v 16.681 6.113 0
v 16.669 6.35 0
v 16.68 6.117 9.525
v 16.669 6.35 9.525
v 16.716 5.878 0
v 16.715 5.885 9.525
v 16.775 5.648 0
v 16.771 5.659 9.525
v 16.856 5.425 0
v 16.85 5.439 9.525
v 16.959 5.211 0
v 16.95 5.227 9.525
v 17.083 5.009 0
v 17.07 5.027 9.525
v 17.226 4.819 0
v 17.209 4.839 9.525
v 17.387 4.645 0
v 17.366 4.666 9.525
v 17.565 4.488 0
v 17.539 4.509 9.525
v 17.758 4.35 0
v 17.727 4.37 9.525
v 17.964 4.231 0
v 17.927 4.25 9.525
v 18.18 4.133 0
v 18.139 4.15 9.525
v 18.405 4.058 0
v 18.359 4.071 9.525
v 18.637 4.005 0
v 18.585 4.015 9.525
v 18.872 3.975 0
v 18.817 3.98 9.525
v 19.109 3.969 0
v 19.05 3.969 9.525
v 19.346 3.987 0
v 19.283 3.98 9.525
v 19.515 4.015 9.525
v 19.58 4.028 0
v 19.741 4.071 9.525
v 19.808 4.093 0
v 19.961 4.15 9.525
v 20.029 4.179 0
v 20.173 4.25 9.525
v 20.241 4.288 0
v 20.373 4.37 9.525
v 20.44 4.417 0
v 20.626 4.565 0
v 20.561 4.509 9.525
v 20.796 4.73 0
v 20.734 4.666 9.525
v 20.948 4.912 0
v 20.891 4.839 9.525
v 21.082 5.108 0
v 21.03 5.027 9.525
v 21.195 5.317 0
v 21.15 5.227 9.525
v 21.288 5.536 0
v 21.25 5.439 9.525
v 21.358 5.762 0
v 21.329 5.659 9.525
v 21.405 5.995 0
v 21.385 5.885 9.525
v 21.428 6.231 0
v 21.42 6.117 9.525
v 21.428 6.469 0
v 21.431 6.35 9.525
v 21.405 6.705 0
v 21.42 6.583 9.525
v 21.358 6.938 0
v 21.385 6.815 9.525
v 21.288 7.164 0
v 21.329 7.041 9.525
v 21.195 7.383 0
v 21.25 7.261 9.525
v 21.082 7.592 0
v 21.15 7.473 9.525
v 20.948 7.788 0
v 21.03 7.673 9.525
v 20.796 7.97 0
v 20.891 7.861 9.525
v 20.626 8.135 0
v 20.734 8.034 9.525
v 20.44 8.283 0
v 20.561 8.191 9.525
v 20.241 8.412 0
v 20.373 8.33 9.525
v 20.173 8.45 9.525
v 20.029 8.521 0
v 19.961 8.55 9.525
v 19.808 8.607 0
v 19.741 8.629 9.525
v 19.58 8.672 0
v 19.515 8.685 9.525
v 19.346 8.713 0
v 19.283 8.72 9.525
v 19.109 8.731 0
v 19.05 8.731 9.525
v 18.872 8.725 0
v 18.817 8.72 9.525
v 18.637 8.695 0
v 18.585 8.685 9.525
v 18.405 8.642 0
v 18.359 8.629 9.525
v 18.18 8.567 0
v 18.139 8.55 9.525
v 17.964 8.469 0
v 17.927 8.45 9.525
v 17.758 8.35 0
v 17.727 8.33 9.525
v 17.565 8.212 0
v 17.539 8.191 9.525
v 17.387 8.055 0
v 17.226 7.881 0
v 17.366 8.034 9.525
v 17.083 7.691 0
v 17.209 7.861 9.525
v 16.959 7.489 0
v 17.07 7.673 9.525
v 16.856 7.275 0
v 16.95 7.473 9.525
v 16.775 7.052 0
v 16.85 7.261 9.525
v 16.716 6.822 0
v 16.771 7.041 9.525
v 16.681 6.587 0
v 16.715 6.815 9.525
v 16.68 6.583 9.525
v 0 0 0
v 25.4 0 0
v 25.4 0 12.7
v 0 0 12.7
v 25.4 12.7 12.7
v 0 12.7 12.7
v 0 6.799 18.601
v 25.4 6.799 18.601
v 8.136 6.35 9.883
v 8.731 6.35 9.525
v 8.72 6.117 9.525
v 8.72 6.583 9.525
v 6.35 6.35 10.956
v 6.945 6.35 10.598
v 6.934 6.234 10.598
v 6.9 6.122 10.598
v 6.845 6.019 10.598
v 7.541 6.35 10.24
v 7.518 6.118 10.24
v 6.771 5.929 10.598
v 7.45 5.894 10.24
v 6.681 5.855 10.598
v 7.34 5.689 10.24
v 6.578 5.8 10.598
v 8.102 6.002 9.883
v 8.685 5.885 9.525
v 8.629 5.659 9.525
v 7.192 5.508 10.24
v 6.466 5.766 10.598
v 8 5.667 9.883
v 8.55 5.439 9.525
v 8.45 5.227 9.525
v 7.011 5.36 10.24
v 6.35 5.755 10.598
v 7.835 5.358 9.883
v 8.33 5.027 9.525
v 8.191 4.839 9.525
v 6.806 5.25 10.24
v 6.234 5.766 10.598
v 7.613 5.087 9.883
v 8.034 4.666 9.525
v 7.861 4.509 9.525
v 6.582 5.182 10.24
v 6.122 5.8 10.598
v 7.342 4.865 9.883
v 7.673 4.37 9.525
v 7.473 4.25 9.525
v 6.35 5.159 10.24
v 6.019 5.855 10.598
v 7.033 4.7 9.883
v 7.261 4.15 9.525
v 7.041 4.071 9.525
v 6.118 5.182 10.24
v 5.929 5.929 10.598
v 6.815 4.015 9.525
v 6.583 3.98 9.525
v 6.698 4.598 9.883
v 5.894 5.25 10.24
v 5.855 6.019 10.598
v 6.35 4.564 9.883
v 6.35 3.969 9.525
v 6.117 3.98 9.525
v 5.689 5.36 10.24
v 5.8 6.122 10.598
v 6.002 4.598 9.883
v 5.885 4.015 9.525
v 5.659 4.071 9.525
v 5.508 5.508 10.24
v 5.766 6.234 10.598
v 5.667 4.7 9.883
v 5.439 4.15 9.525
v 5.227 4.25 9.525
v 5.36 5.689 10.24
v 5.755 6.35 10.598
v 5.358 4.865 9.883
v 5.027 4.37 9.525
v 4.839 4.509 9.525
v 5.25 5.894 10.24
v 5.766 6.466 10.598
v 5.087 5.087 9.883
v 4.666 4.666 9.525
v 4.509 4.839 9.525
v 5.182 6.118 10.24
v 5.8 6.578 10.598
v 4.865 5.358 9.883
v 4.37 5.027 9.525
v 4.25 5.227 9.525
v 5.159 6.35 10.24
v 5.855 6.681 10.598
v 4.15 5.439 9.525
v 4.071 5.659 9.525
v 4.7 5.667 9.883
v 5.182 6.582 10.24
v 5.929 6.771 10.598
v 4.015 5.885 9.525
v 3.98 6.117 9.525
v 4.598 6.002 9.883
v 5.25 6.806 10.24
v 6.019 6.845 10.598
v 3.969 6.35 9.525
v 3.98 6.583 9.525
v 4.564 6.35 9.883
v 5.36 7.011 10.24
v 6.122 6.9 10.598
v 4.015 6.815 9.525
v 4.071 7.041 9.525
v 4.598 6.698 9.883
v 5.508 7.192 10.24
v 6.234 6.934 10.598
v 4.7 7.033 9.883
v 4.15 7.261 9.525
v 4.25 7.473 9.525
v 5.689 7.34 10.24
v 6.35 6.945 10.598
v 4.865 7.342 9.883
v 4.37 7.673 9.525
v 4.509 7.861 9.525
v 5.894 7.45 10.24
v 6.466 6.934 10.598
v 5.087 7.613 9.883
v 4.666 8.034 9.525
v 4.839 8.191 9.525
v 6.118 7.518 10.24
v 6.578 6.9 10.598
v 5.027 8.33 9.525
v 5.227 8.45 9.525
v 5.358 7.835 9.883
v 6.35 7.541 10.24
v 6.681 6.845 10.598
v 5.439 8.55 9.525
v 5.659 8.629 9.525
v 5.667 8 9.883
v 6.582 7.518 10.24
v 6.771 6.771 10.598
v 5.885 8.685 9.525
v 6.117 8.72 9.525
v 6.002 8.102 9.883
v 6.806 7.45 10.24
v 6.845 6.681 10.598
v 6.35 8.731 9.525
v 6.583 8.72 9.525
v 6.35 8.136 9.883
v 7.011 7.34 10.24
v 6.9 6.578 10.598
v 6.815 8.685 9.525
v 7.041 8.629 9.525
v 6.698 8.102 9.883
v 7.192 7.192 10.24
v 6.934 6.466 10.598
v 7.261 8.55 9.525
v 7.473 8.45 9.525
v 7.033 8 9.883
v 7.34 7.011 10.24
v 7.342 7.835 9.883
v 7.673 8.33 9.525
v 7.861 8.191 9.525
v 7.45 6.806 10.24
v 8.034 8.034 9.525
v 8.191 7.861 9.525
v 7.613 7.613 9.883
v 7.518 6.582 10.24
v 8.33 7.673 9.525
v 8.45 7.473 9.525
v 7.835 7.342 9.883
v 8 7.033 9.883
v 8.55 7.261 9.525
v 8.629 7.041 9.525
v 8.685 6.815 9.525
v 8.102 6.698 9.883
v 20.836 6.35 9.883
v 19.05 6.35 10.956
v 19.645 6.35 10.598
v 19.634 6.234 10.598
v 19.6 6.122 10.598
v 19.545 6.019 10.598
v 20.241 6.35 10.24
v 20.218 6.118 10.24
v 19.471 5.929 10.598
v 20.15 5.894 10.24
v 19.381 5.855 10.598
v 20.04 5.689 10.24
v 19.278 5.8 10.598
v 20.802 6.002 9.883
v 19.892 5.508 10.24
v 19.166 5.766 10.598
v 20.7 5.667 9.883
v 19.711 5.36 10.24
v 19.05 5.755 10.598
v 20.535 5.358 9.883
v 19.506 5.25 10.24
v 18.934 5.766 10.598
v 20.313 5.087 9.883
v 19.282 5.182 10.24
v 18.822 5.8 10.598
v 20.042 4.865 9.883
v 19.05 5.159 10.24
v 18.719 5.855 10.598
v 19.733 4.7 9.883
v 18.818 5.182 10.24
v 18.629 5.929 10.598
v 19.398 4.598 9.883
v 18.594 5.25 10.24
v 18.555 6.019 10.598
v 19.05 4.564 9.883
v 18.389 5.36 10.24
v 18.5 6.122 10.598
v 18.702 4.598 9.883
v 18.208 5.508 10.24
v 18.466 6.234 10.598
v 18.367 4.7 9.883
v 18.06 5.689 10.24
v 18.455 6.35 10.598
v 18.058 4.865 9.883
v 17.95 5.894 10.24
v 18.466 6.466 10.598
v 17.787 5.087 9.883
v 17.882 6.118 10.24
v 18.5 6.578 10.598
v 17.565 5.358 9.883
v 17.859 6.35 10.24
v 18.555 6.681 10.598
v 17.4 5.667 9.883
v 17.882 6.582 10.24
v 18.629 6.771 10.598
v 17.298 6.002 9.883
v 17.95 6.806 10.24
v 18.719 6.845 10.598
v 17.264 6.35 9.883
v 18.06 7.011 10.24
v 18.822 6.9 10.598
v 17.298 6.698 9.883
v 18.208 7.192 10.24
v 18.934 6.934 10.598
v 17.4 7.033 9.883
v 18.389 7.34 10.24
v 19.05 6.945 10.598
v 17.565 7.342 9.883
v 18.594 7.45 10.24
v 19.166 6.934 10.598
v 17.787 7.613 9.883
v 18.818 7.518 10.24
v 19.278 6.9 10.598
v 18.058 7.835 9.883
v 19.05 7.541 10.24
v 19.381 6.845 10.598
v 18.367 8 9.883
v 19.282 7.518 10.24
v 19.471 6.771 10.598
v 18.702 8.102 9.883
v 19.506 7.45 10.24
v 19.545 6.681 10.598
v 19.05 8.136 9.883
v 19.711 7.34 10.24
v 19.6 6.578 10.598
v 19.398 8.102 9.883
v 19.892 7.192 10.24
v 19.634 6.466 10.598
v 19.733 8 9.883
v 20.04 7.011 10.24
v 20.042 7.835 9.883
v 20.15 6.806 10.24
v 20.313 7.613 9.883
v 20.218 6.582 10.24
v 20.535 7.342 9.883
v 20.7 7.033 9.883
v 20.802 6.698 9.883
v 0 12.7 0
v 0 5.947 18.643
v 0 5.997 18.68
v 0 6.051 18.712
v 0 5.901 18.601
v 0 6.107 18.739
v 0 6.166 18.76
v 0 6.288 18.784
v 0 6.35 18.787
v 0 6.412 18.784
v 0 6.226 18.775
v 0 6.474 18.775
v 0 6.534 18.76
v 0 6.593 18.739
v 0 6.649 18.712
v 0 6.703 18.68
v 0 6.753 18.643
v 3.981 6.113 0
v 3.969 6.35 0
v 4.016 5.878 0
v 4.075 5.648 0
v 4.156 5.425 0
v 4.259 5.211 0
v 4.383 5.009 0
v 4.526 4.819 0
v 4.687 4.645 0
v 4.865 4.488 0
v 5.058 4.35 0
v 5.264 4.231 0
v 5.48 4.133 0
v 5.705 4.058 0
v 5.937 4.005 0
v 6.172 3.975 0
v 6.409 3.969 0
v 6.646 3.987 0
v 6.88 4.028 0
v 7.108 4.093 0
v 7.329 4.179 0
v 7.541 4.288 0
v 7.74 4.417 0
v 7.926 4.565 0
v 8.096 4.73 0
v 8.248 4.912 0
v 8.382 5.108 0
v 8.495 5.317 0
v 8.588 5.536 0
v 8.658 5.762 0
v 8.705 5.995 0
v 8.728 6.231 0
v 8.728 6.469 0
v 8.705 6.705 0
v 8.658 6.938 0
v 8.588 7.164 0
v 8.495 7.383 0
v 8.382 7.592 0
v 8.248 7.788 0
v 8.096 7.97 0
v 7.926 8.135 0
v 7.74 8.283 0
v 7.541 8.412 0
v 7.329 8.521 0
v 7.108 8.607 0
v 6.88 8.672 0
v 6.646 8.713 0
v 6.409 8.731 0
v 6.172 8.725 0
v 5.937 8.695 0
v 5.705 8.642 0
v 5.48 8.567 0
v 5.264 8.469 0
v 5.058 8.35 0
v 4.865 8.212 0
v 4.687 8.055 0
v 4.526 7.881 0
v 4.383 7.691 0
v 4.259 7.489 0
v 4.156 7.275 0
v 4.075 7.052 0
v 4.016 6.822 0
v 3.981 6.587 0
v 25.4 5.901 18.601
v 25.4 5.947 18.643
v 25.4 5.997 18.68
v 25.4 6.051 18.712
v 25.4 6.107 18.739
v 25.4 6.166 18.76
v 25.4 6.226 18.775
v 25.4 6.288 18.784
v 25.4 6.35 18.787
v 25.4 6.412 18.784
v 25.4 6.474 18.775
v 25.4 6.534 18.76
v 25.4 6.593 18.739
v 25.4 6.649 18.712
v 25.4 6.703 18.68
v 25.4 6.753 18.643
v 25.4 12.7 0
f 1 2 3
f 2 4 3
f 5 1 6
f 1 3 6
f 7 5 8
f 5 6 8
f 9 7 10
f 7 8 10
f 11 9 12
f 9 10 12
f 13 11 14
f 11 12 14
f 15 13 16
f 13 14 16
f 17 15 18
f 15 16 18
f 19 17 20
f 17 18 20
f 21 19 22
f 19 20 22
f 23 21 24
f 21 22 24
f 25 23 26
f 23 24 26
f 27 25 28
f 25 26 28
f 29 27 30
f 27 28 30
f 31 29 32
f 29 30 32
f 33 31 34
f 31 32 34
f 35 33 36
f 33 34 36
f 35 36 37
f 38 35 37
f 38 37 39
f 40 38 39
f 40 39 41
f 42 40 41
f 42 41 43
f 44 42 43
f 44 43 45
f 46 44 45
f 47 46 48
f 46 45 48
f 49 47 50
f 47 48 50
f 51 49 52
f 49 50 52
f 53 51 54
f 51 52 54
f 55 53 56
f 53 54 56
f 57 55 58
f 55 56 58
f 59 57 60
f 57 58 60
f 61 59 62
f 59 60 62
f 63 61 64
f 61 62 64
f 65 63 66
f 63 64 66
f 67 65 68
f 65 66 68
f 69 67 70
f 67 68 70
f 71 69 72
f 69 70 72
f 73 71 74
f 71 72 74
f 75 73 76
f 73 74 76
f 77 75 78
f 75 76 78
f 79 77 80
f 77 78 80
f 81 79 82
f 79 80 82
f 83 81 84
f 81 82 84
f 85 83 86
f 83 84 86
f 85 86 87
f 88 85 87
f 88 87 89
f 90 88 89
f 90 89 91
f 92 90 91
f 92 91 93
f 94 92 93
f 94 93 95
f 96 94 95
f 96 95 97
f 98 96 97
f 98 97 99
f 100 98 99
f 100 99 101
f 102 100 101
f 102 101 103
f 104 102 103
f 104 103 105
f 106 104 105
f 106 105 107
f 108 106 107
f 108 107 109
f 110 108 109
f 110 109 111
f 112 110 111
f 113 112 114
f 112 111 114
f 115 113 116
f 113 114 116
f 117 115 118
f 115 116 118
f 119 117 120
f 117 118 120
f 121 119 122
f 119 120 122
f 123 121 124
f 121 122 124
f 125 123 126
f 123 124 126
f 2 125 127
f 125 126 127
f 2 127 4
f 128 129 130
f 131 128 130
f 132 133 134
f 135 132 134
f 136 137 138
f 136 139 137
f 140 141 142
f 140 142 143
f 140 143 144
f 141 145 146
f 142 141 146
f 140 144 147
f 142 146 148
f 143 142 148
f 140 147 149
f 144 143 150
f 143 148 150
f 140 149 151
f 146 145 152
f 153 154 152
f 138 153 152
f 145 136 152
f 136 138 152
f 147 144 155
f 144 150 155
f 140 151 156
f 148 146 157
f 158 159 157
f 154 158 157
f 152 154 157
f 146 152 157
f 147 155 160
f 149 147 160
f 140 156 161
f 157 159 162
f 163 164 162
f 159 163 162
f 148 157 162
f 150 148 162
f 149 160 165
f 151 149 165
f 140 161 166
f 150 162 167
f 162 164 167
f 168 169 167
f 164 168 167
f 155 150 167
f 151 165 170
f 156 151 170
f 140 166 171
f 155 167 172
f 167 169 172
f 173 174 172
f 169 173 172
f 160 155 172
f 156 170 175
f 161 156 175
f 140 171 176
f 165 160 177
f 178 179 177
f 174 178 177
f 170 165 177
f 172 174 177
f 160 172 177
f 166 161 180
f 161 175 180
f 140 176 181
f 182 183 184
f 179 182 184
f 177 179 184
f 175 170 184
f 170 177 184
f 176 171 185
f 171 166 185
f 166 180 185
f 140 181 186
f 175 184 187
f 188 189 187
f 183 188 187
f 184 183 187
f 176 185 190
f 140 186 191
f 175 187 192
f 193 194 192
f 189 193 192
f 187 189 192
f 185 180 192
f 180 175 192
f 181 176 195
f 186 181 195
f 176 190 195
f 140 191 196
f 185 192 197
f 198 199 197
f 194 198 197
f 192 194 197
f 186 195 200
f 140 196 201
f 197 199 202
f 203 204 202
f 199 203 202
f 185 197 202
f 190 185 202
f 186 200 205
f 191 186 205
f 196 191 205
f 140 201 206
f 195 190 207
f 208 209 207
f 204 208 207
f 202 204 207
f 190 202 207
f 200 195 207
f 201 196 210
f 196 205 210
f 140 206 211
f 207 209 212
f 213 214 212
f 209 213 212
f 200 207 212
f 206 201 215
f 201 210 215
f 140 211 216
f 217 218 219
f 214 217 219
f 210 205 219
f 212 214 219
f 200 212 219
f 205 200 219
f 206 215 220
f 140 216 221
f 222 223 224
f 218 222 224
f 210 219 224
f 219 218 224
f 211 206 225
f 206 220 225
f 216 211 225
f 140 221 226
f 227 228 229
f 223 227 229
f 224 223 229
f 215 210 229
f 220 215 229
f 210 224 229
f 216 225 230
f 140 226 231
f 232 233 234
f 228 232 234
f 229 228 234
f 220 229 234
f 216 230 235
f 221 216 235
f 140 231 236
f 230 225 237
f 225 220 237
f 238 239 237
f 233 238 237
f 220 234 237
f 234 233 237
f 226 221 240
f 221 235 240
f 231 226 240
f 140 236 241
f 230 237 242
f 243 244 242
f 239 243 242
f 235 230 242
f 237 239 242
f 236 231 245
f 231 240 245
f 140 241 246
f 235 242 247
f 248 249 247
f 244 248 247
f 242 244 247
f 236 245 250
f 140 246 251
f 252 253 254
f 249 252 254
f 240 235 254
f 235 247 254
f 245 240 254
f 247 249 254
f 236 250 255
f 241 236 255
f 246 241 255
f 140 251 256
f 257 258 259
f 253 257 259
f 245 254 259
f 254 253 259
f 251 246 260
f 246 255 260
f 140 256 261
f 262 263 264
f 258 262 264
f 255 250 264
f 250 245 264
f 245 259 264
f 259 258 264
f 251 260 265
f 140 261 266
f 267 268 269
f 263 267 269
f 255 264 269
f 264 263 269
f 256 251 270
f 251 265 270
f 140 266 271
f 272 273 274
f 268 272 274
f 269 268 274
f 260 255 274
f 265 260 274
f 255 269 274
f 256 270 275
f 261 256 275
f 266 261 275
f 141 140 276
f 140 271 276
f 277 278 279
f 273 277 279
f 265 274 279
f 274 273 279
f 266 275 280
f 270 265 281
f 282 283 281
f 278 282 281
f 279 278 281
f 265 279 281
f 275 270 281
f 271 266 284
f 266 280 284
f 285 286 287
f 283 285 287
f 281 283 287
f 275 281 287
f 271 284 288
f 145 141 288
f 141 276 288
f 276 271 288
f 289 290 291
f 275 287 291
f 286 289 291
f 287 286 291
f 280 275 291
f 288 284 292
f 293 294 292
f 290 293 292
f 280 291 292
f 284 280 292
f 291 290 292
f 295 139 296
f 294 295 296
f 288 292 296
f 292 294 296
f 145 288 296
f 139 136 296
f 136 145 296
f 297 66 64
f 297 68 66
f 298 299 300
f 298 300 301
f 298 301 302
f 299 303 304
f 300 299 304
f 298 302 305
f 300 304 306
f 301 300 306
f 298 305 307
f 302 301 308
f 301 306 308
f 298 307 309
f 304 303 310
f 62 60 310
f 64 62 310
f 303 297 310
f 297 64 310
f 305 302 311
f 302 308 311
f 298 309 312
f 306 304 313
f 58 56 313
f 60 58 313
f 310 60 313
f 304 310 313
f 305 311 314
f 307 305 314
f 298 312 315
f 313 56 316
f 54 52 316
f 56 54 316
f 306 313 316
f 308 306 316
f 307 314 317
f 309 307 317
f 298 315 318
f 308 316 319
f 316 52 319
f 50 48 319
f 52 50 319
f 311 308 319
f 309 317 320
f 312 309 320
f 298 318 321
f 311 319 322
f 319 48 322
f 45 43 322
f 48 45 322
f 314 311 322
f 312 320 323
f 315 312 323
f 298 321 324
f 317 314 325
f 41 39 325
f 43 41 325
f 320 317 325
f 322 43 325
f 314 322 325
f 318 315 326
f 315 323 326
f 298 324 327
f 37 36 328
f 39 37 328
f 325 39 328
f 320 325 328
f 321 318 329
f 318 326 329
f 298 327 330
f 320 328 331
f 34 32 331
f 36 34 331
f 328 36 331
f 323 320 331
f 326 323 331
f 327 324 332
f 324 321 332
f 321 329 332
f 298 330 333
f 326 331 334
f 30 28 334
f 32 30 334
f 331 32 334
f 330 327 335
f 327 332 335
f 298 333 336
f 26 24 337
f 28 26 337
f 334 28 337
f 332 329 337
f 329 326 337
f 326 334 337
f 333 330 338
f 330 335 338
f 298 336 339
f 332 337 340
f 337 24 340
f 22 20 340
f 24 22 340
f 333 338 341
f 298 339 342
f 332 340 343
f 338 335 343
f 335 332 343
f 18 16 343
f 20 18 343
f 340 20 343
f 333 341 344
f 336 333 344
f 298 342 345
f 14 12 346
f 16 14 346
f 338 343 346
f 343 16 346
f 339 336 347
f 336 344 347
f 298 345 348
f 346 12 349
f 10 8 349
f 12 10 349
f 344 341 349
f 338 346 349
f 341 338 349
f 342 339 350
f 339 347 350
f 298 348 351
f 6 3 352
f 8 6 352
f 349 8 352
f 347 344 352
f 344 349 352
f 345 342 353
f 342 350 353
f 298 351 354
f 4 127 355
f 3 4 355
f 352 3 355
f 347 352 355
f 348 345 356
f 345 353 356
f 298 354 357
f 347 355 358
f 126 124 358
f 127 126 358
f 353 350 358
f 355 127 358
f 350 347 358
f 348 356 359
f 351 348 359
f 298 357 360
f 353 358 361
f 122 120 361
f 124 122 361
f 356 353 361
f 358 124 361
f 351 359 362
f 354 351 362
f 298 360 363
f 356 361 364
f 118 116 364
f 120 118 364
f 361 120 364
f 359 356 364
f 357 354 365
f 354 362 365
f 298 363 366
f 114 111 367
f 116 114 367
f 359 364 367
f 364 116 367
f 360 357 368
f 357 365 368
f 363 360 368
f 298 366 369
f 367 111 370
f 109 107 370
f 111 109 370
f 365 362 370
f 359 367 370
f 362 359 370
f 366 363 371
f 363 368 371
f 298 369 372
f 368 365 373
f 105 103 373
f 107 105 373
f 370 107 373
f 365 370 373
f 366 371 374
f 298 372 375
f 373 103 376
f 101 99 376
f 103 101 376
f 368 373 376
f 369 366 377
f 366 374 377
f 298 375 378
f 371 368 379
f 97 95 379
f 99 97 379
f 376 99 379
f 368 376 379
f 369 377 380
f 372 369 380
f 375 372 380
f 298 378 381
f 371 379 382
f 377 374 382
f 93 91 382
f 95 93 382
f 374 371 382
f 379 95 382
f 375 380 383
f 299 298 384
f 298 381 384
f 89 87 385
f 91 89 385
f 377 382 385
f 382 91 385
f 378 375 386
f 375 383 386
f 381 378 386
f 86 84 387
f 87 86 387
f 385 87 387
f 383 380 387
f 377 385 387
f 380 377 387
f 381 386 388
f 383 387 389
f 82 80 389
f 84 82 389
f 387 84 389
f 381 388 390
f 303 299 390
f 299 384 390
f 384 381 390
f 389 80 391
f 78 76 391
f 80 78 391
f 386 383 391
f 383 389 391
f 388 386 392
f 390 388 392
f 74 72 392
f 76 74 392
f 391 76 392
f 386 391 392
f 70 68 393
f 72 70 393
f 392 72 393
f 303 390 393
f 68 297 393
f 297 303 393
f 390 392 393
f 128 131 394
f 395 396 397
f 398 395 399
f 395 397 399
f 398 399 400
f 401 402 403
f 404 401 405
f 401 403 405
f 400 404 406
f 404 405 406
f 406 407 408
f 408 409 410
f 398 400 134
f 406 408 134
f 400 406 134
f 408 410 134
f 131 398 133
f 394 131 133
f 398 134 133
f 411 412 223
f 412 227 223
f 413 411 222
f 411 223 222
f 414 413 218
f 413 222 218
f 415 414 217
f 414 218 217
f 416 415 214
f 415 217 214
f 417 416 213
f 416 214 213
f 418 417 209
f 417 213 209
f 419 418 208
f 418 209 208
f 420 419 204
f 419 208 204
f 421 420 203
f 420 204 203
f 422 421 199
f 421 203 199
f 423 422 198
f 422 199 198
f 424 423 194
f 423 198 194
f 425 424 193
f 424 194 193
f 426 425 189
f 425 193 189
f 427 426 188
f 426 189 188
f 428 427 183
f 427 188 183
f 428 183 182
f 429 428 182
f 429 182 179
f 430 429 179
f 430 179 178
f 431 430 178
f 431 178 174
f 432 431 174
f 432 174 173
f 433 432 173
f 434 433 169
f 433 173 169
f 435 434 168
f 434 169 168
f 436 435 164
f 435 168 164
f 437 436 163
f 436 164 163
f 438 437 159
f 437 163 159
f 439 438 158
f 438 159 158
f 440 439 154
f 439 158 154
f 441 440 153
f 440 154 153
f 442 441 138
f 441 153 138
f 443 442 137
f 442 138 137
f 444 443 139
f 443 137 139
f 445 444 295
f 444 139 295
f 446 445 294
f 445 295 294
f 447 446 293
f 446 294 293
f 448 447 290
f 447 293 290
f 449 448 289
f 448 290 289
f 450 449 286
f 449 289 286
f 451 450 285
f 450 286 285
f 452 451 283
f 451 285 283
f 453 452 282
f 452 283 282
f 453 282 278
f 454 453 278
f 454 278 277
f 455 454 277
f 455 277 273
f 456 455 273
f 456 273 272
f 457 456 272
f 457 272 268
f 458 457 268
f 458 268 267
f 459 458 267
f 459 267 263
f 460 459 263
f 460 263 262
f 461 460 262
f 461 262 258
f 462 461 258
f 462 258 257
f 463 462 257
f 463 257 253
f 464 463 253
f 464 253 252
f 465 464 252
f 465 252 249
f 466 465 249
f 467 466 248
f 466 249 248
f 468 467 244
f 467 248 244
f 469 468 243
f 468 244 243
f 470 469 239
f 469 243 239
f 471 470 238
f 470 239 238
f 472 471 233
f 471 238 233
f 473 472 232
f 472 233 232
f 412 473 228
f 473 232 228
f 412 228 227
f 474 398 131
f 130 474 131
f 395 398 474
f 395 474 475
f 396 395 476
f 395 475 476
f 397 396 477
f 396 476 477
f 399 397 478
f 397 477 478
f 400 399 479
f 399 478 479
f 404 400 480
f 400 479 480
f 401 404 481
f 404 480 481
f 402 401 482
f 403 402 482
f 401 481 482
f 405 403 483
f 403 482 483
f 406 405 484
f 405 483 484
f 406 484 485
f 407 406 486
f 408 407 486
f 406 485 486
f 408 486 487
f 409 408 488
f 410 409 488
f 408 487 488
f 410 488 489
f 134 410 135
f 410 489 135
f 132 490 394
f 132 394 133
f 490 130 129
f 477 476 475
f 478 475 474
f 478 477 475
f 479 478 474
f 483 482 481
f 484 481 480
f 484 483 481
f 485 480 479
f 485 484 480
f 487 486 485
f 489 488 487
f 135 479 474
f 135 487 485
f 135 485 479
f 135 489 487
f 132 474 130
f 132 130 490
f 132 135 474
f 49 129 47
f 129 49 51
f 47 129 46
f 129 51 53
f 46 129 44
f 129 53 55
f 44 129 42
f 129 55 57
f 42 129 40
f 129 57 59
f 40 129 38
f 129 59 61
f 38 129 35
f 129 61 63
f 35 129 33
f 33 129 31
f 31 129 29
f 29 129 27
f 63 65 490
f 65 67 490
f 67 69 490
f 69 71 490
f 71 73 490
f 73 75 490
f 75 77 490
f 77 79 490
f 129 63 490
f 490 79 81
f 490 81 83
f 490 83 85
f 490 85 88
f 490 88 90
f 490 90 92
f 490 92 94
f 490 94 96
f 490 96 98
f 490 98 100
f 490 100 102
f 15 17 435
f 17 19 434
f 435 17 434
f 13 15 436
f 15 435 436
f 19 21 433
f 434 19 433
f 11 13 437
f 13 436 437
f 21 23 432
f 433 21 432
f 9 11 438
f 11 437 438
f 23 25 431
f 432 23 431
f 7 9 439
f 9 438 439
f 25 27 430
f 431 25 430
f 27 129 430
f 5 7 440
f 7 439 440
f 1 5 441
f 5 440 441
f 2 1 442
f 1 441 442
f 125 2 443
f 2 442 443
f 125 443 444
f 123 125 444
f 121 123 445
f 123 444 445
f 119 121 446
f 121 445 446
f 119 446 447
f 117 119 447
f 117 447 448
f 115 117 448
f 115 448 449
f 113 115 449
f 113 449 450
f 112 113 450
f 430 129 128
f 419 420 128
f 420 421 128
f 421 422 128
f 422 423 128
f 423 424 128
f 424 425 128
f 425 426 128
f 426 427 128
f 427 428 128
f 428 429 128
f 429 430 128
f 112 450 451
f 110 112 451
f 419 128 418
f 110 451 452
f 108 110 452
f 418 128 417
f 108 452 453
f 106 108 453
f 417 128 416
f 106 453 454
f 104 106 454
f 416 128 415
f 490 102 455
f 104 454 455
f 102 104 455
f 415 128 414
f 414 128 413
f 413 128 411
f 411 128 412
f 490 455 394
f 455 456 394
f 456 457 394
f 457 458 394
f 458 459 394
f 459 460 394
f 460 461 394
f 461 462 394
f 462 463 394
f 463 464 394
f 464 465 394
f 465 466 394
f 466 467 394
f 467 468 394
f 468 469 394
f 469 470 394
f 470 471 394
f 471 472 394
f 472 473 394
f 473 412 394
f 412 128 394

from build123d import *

# Parameters (mm, degrees)
F0_W     = 12.7
F0_H     = 12.7
F1_DEPTH = 25.4
F3_D     = 4.7625
F3_DEPTH = 9.525
F3_TIP   = 1.4307993491
F4_R     = 0.635


with BuildPart() as f1:
    # F0 (on Right) → F1 (new body)
    with BuildSketch(Plane.YZ):
        with Locations((6.35, 6.35)):
            Rectangle(F0_W, F0_H)
        Polygon((6.35, 19.05), (0, 12.7), (12.7, 12.7), align=None)
    extrude(amount=F1_DEPTH)

    # F3
    with Locations(Plane(origin=(0, 0, 0), x_dir=(1, 0, 0), z_dir=(0, 0, -1))):
        with Locations((6.35, -6.35), (19.05, -6.35)):
            Hole(F3_D / 2, depth=F3_DEPTH)
            with Locations((0, 0, -(F3_DEPTH + F3_TIP / 2))):  # 118° drill point
                Cone(0, F3_D / 2, F3_TIP, mode=Mode.SUBTRACT)

    # F4
    f4_edges = [f1.edges().sort_by_distance(p)[0] for p in [
        (12.7, 6.35, 19.05),
    ]]
    fillet(f4_edges, radius=F4_R)


solid = f1.part
